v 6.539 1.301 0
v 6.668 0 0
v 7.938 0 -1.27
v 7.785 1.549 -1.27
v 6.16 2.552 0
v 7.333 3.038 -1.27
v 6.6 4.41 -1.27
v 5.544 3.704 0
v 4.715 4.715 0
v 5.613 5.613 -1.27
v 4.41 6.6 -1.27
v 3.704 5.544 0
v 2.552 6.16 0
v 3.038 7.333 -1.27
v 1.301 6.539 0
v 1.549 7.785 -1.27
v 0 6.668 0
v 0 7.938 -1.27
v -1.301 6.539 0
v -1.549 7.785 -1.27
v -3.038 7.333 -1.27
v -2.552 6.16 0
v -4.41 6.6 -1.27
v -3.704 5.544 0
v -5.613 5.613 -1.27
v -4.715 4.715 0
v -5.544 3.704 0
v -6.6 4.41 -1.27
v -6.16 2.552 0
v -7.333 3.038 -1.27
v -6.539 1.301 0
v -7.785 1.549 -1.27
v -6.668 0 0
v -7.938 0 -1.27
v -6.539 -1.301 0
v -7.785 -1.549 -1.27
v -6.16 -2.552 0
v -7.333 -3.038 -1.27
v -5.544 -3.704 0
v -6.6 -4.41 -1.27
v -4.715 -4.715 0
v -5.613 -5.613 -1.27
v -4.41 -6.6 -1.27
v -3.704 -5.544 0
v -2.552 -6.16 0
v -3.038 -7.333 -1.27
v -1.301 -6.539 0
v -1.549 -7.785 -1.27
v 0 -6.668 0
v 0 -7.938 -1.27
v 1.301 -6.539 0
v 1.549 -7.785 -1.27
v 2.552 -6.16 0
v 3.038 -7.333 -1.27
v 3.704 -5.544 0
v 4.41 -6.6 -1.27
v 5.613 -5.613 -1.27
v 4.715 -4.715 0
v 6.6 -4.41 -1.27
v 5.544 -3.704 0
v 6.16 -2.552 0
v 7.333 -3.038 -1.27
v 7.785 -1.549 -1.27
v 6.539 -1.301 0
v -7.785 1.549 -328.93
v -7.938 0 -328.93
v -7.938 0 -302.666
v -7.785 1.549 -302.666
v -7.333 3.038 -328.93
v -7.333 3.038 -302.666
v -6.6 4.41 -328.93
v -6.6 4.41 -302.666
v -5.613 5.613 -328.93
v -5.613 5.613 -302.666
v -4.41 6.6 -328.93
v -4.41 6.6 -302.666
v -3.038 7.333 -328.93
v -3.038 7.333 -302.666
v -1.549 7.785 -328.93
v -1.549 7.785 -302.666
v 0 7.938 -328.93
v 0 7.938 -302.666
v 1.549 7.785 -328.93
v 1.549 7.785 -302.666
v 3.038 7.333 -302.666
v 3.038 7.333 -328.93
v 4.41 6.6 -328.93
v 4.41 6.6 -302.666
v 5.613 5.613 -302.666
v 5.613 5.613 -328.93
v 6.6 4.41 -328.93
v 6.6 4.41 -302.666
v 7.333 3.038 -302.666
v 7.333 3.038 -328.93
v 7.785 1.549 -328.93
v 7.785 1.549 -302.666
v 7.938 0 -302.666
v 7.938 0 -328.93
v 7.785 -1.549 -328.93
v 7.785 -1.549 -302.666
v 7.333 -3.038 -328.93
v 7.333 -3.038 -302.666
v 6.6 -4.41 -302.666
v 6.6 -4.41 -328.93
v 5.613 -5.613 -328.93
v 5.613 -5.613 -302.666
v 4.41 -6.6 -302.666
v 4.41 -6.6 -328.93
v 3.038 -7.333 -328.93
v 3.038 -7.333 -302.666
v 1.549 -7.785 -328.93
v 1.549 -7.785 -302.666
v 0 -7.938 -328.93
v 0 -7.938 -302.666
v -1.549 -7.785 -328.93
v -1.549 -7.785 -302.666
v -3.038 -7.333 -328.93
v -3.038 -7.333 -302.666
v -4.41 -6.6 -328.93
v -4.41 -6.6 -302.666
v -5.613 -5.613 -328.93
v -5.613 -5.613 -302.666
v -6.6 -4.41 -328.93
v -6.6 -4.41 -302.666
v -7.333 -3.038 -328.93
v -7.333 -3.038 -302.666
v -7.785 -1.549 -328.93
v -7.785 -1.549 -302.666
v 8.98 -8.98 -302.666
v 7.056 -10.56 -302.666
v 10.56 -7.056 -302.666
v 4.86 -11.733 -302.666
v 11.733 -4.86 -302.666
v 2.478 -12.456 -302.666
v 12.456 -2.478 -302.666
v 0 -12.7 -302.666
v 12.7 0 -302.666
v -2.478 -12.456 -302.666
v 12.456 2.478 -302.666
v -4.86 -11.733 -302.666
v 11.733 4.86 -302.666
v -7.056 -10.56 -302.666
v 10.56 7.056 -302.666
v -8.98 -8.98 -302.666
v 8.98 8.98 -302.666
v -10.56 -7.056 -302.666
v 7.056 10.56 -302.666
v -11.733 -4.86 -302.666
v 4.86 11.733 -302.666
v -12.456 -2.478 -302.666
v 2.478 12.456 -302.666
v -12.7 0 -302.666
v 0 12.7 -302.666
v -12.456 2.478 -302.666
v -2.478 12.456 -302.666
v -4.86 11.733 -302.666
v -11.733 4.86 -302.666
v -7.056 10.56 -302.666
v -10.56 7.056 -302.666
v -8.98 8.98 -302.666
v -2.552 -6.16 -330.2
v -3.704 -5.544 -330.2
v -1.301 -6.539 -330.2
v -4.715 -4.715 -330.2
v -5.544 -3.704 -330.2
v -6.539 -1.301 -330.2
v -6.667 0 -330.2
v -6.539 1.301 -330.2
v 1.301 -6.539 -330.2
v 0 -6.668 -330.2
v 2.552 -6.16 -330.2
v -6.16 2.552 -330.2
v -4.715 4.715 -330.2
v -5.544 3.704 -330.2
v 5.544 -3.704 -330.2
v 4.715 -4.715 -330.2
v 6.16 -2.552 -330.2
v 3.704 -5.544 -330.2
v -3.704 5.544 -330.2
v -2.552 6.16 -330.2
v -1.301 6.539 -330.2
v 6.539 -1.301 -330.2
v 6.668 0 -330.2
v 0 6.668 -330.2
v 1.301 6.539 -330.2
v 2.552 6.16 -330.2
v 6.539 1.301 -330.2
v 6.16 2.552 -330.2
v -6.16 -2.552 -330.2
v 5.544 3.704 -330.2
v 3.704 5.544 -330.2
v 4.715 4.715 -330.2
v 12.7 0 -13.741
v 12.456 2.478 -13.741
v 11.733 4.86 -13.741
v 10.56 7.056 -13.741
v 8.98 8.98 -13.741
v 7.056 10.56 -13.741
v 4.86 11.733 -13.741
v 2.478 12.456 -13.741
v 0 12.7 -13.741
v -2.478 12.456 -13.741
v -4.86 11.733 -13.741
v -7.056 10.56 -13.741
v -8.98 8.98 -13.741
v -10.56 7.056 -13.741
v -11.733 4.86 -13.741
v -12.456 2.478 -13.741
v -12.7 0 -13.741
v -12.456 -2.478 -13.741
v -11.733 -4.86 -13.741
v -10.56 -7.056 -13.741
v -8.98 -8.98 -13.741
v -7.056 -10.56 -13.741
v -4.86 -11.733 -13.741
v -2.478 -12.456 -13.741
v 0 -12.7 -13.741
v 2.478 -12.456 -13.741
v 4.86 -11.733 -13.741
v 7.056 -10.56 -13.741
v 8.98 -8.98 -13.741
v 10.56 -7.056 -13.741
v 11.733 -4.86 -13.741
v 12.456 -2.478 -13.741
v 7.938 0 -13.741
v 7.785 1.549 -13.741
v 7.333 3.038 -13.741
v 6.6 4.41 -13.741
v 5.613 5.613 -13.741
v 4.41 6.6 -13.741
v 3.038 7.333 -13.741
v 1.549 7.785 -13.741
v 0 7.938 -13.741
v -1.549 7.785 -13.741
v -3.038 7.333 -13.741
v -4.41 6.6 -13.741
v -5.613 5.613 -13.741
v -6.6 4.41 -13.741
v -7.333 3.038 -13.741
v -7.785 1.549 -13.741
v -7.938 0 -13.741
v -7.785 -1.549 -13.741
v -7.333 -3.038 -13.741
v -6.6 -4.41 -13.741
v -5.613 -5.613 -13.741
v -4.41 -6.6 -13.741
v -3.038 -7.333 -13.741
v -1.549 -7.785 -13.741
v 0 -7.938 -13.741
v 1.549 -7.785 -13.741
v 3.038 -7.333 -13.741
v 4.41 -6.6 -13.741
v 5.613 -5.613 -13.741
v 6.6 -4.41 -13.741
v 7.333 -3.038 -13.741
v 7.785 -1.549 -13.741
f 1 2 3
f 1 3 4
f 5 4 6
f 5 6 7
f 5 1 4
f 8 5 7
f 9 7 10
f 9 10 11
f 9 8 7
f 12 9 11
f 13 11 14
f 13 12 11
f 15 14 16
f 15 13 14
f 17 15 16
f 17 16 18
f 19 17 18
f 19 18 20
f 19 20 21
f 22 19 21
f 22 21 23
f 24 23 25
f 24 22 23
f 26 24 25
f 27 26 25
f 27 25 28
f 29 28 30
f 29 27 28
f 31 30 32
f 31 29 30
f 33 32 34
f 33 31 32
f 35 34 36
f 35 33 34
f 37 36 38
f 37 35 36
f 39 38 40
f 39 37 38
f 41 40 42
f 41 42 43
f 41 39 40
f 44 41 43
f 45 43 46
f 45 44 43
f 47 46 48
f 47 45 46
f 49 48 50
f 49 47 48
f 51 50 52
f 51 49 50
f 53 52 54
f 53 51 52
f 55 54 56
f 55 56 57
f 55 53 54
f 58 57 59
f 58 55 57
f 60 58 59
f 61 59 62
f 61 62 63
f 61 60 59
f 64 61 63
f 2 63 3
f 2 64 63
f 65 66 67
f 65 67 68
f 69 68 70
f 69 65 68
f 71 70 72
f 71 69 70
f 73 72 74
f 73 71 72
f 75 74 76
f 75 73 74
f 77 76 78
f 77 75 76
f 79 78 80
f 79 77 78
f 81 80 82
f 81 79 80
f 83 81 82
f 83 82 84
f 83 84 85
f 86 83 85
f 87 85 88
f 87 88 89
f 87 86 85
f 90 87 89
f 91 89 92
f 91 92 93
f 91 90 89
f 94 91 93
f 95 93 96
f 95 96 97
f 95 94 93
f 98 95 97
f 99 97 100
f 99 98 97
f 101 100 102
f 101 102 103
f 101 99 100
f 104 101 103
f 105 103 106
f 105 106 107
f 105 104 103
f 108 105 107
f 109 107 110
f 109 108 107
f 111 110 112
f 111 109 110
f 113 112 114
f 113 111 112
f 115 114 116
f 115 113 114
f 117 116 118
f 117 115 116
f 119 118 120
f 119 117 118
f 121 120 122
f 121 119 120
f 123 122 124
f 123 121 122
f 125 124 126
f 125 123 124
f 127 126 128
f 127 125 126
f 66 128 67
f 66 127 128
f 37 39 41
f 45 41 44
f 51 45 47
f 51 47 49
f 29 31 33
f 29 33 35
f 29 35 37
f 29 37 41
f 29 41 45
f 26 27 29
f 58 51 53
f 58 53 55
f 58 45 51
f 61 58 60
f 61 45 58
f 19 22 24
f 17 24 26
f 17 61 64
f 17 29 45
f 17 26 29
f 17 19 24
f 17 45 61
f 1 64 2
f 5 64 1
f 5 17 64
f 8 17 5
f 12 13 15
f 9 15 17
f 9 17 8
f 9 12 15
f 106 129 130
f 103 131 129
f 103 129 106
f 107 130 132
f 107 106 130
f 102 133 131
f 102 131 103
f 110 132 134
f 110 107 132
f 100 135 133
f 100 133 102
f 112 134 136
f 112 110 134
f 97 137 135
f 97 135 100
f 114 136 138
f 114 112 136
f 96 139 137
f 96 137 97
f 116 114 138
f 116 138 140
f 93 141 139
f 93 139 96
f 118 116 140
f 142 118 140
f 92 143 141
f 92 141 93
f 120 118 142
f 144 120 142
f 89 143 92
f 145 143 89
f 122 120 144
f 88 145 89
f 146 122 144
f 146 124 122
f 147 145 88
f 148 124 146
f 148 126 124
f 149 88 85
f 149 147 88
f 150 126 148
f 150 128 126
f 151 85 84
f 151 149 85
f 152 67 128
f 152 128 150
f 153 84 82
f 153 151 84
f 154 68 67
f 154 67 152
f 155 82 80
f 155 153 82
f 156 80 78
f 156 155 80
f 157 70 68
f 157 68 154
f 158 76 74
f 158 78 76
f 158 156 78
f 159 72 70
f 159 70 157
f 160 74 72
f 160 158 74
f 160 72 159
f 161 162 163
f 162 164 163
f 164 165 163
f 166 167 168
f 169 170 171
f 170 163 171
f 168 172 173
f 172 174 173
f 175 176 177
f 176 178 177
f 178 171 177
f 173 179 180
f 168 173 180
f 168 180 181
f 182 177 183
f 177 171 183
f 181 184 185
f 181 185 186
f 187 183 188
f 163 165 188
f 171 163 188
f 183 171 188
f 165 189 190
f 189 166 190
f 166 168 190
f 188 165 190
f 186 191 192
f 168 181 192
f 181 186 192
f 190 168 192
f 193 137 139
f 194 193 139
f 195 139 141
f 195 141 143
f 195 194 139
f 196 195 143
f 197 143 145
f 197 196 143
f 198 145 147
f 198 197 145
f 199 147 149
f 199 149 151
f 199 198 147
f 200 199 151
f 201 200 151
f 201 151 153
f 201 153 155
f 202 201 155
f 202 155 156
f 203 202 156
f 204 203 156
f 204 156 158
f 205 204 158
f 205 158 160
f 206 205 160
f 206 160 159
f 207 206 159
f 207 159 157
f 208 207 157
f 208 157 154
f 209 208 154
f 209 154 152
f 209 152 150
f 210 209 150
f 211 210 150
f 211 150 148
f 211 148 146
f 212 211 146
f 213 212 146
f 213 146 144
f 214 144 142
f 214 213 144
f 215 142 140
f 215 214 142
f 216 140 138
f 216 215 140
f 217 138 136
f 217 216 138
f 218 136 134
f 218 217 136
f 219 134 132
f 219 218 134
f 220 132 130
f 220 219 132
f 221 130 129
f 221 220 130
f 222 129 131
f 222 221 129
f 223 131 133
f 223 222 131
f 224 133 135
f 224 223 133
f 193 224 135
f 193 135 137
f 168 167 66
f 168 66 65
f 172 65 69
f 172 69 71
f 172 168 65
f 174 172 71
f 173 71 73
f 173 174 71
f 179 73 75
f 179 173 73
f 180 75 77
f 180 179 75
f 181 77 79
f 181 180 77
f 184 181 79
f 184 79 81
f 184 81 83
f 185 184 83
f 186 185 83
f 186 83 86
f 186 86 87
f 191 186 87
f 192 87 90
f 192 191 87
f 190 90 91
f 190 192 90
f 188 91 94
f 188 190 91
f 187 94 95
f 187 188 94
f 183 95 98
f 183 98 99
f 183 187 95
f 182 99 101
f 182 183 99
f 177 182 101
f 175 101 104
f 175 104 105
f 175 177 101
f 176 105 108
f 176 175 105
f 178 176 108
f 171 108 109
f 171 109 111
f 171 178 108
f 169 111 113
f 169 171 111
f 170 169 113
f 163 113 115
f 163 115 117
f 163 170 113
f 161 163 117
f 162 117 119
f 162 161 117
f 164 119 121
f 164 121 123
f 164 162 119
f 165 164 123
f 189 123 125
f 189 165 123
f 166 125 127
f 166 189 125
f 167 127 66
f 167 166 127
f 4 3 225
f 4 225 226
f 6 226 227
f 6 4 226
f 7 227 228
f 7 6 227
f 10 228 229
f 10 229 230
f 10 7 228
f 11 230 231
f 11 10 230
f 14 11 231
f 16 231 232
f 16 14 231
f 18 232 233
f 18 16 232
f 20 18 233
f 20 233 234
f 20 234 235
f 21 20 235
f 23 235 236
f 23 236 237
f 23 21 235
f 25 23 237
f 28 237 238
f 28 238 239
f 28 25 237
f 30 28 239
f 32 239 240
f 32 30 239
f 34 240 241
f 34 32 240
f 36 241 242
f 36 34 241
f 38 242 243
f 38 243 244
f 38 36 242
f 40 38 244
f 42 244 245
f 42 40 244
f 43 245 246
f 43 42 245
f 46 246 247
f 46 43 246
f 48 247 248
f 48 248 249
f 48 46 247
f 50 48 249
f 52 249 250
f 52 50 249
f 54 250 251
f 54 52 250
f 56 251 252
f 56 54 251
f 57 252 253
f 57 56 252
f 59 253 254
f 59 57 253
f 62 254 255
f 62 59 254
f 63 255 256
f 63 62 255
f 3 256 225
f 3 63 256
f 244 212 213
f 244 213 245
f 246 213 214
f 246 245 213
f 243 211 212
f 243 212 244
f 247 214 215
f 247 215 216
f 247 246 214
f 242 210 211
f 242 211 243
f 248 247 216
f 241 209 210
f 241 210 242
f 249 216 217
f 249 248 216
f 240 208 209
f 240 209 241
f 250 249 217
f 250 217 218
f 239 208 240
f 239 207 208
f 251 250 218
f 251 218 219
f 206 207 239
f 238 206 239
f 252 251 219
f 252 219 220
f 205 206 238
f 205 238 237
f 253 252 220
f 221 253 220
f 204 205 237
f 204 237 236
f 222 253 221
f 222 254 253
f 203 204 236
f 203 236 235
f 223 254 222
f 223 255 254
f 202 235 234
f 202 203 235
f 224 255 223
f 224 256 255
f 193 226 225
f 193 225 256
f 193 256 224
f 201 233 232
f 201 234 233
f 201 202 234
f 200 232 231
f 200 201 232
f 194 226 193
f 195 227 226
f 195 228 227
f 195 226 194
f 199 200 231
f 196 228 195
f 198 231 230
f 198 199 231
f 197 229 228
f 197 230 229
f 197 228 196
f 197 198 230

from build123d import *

# Parameters (mm, degrees)
SKETCH1_R           = 12.7
BOSS_EXTRUDE1_DEPTH = 330.2
CUT_EXTRUDE2_START  = -27.5336
SKETCH3_R           = 12.7
SKETCH3_R_2         = 7.9375
CUT_EXTRUDE2_DEPTH  = 27.5336
SKETCH2_R           = 12.7
SKETCH2_R_2         = 7.9375
CUT_EXTRUDE1_DEPTH  = 13.7414
CHAMFER1_SIZE       = 1.27


with BuildPart() as part:
    # Sketch1 → Boss-Extrude1 (new body)
    with BuildSketch(Plane.XY):
        Circle(SKETCH1_R)
    extrude(amount=-BOSS_EXTRUDE1_DEPTH)

    # Sketch3 → Cut-Extrude2 (cut)
    with BuildSketch(Plane(origin=(0, 0, -330.2), x_dir=(-1, 0, 0), z_dir=(0, 0, -1)).offset(CUT_EXTRUDE2_START)):
        Circle(SKETCH3_R)
        Circle(SKETCH3_R_2, mode=Mode.SUBTRACT)
    extrude(amount=CUT_EXTRUDE2_DEPTH, mode=Mode.SUBTRACT)

    # Sketch2 → Cut-Extrude1 (cut)
    with BuildSketch(Plane.XY):
        Circle(SKETCH2_R)
        Circle(SKETCH2_R_2, mode=Mode.SUBTRACT)
    extrude(amount=-CUT_EXTRUDE1_DEPTH, mode=Mode.SUBTRACT)

    # Chamfer1
    chamfer1_edges = [part.edges().sort_by_distance(p)[0] for p in [
        (-7.9375, 0, 0),
        (7.9375, 0, -330.2),
    ]]
    chamfer(chamfer1_edges, length=CHAMFER1_SIZE)


solid = part.part
